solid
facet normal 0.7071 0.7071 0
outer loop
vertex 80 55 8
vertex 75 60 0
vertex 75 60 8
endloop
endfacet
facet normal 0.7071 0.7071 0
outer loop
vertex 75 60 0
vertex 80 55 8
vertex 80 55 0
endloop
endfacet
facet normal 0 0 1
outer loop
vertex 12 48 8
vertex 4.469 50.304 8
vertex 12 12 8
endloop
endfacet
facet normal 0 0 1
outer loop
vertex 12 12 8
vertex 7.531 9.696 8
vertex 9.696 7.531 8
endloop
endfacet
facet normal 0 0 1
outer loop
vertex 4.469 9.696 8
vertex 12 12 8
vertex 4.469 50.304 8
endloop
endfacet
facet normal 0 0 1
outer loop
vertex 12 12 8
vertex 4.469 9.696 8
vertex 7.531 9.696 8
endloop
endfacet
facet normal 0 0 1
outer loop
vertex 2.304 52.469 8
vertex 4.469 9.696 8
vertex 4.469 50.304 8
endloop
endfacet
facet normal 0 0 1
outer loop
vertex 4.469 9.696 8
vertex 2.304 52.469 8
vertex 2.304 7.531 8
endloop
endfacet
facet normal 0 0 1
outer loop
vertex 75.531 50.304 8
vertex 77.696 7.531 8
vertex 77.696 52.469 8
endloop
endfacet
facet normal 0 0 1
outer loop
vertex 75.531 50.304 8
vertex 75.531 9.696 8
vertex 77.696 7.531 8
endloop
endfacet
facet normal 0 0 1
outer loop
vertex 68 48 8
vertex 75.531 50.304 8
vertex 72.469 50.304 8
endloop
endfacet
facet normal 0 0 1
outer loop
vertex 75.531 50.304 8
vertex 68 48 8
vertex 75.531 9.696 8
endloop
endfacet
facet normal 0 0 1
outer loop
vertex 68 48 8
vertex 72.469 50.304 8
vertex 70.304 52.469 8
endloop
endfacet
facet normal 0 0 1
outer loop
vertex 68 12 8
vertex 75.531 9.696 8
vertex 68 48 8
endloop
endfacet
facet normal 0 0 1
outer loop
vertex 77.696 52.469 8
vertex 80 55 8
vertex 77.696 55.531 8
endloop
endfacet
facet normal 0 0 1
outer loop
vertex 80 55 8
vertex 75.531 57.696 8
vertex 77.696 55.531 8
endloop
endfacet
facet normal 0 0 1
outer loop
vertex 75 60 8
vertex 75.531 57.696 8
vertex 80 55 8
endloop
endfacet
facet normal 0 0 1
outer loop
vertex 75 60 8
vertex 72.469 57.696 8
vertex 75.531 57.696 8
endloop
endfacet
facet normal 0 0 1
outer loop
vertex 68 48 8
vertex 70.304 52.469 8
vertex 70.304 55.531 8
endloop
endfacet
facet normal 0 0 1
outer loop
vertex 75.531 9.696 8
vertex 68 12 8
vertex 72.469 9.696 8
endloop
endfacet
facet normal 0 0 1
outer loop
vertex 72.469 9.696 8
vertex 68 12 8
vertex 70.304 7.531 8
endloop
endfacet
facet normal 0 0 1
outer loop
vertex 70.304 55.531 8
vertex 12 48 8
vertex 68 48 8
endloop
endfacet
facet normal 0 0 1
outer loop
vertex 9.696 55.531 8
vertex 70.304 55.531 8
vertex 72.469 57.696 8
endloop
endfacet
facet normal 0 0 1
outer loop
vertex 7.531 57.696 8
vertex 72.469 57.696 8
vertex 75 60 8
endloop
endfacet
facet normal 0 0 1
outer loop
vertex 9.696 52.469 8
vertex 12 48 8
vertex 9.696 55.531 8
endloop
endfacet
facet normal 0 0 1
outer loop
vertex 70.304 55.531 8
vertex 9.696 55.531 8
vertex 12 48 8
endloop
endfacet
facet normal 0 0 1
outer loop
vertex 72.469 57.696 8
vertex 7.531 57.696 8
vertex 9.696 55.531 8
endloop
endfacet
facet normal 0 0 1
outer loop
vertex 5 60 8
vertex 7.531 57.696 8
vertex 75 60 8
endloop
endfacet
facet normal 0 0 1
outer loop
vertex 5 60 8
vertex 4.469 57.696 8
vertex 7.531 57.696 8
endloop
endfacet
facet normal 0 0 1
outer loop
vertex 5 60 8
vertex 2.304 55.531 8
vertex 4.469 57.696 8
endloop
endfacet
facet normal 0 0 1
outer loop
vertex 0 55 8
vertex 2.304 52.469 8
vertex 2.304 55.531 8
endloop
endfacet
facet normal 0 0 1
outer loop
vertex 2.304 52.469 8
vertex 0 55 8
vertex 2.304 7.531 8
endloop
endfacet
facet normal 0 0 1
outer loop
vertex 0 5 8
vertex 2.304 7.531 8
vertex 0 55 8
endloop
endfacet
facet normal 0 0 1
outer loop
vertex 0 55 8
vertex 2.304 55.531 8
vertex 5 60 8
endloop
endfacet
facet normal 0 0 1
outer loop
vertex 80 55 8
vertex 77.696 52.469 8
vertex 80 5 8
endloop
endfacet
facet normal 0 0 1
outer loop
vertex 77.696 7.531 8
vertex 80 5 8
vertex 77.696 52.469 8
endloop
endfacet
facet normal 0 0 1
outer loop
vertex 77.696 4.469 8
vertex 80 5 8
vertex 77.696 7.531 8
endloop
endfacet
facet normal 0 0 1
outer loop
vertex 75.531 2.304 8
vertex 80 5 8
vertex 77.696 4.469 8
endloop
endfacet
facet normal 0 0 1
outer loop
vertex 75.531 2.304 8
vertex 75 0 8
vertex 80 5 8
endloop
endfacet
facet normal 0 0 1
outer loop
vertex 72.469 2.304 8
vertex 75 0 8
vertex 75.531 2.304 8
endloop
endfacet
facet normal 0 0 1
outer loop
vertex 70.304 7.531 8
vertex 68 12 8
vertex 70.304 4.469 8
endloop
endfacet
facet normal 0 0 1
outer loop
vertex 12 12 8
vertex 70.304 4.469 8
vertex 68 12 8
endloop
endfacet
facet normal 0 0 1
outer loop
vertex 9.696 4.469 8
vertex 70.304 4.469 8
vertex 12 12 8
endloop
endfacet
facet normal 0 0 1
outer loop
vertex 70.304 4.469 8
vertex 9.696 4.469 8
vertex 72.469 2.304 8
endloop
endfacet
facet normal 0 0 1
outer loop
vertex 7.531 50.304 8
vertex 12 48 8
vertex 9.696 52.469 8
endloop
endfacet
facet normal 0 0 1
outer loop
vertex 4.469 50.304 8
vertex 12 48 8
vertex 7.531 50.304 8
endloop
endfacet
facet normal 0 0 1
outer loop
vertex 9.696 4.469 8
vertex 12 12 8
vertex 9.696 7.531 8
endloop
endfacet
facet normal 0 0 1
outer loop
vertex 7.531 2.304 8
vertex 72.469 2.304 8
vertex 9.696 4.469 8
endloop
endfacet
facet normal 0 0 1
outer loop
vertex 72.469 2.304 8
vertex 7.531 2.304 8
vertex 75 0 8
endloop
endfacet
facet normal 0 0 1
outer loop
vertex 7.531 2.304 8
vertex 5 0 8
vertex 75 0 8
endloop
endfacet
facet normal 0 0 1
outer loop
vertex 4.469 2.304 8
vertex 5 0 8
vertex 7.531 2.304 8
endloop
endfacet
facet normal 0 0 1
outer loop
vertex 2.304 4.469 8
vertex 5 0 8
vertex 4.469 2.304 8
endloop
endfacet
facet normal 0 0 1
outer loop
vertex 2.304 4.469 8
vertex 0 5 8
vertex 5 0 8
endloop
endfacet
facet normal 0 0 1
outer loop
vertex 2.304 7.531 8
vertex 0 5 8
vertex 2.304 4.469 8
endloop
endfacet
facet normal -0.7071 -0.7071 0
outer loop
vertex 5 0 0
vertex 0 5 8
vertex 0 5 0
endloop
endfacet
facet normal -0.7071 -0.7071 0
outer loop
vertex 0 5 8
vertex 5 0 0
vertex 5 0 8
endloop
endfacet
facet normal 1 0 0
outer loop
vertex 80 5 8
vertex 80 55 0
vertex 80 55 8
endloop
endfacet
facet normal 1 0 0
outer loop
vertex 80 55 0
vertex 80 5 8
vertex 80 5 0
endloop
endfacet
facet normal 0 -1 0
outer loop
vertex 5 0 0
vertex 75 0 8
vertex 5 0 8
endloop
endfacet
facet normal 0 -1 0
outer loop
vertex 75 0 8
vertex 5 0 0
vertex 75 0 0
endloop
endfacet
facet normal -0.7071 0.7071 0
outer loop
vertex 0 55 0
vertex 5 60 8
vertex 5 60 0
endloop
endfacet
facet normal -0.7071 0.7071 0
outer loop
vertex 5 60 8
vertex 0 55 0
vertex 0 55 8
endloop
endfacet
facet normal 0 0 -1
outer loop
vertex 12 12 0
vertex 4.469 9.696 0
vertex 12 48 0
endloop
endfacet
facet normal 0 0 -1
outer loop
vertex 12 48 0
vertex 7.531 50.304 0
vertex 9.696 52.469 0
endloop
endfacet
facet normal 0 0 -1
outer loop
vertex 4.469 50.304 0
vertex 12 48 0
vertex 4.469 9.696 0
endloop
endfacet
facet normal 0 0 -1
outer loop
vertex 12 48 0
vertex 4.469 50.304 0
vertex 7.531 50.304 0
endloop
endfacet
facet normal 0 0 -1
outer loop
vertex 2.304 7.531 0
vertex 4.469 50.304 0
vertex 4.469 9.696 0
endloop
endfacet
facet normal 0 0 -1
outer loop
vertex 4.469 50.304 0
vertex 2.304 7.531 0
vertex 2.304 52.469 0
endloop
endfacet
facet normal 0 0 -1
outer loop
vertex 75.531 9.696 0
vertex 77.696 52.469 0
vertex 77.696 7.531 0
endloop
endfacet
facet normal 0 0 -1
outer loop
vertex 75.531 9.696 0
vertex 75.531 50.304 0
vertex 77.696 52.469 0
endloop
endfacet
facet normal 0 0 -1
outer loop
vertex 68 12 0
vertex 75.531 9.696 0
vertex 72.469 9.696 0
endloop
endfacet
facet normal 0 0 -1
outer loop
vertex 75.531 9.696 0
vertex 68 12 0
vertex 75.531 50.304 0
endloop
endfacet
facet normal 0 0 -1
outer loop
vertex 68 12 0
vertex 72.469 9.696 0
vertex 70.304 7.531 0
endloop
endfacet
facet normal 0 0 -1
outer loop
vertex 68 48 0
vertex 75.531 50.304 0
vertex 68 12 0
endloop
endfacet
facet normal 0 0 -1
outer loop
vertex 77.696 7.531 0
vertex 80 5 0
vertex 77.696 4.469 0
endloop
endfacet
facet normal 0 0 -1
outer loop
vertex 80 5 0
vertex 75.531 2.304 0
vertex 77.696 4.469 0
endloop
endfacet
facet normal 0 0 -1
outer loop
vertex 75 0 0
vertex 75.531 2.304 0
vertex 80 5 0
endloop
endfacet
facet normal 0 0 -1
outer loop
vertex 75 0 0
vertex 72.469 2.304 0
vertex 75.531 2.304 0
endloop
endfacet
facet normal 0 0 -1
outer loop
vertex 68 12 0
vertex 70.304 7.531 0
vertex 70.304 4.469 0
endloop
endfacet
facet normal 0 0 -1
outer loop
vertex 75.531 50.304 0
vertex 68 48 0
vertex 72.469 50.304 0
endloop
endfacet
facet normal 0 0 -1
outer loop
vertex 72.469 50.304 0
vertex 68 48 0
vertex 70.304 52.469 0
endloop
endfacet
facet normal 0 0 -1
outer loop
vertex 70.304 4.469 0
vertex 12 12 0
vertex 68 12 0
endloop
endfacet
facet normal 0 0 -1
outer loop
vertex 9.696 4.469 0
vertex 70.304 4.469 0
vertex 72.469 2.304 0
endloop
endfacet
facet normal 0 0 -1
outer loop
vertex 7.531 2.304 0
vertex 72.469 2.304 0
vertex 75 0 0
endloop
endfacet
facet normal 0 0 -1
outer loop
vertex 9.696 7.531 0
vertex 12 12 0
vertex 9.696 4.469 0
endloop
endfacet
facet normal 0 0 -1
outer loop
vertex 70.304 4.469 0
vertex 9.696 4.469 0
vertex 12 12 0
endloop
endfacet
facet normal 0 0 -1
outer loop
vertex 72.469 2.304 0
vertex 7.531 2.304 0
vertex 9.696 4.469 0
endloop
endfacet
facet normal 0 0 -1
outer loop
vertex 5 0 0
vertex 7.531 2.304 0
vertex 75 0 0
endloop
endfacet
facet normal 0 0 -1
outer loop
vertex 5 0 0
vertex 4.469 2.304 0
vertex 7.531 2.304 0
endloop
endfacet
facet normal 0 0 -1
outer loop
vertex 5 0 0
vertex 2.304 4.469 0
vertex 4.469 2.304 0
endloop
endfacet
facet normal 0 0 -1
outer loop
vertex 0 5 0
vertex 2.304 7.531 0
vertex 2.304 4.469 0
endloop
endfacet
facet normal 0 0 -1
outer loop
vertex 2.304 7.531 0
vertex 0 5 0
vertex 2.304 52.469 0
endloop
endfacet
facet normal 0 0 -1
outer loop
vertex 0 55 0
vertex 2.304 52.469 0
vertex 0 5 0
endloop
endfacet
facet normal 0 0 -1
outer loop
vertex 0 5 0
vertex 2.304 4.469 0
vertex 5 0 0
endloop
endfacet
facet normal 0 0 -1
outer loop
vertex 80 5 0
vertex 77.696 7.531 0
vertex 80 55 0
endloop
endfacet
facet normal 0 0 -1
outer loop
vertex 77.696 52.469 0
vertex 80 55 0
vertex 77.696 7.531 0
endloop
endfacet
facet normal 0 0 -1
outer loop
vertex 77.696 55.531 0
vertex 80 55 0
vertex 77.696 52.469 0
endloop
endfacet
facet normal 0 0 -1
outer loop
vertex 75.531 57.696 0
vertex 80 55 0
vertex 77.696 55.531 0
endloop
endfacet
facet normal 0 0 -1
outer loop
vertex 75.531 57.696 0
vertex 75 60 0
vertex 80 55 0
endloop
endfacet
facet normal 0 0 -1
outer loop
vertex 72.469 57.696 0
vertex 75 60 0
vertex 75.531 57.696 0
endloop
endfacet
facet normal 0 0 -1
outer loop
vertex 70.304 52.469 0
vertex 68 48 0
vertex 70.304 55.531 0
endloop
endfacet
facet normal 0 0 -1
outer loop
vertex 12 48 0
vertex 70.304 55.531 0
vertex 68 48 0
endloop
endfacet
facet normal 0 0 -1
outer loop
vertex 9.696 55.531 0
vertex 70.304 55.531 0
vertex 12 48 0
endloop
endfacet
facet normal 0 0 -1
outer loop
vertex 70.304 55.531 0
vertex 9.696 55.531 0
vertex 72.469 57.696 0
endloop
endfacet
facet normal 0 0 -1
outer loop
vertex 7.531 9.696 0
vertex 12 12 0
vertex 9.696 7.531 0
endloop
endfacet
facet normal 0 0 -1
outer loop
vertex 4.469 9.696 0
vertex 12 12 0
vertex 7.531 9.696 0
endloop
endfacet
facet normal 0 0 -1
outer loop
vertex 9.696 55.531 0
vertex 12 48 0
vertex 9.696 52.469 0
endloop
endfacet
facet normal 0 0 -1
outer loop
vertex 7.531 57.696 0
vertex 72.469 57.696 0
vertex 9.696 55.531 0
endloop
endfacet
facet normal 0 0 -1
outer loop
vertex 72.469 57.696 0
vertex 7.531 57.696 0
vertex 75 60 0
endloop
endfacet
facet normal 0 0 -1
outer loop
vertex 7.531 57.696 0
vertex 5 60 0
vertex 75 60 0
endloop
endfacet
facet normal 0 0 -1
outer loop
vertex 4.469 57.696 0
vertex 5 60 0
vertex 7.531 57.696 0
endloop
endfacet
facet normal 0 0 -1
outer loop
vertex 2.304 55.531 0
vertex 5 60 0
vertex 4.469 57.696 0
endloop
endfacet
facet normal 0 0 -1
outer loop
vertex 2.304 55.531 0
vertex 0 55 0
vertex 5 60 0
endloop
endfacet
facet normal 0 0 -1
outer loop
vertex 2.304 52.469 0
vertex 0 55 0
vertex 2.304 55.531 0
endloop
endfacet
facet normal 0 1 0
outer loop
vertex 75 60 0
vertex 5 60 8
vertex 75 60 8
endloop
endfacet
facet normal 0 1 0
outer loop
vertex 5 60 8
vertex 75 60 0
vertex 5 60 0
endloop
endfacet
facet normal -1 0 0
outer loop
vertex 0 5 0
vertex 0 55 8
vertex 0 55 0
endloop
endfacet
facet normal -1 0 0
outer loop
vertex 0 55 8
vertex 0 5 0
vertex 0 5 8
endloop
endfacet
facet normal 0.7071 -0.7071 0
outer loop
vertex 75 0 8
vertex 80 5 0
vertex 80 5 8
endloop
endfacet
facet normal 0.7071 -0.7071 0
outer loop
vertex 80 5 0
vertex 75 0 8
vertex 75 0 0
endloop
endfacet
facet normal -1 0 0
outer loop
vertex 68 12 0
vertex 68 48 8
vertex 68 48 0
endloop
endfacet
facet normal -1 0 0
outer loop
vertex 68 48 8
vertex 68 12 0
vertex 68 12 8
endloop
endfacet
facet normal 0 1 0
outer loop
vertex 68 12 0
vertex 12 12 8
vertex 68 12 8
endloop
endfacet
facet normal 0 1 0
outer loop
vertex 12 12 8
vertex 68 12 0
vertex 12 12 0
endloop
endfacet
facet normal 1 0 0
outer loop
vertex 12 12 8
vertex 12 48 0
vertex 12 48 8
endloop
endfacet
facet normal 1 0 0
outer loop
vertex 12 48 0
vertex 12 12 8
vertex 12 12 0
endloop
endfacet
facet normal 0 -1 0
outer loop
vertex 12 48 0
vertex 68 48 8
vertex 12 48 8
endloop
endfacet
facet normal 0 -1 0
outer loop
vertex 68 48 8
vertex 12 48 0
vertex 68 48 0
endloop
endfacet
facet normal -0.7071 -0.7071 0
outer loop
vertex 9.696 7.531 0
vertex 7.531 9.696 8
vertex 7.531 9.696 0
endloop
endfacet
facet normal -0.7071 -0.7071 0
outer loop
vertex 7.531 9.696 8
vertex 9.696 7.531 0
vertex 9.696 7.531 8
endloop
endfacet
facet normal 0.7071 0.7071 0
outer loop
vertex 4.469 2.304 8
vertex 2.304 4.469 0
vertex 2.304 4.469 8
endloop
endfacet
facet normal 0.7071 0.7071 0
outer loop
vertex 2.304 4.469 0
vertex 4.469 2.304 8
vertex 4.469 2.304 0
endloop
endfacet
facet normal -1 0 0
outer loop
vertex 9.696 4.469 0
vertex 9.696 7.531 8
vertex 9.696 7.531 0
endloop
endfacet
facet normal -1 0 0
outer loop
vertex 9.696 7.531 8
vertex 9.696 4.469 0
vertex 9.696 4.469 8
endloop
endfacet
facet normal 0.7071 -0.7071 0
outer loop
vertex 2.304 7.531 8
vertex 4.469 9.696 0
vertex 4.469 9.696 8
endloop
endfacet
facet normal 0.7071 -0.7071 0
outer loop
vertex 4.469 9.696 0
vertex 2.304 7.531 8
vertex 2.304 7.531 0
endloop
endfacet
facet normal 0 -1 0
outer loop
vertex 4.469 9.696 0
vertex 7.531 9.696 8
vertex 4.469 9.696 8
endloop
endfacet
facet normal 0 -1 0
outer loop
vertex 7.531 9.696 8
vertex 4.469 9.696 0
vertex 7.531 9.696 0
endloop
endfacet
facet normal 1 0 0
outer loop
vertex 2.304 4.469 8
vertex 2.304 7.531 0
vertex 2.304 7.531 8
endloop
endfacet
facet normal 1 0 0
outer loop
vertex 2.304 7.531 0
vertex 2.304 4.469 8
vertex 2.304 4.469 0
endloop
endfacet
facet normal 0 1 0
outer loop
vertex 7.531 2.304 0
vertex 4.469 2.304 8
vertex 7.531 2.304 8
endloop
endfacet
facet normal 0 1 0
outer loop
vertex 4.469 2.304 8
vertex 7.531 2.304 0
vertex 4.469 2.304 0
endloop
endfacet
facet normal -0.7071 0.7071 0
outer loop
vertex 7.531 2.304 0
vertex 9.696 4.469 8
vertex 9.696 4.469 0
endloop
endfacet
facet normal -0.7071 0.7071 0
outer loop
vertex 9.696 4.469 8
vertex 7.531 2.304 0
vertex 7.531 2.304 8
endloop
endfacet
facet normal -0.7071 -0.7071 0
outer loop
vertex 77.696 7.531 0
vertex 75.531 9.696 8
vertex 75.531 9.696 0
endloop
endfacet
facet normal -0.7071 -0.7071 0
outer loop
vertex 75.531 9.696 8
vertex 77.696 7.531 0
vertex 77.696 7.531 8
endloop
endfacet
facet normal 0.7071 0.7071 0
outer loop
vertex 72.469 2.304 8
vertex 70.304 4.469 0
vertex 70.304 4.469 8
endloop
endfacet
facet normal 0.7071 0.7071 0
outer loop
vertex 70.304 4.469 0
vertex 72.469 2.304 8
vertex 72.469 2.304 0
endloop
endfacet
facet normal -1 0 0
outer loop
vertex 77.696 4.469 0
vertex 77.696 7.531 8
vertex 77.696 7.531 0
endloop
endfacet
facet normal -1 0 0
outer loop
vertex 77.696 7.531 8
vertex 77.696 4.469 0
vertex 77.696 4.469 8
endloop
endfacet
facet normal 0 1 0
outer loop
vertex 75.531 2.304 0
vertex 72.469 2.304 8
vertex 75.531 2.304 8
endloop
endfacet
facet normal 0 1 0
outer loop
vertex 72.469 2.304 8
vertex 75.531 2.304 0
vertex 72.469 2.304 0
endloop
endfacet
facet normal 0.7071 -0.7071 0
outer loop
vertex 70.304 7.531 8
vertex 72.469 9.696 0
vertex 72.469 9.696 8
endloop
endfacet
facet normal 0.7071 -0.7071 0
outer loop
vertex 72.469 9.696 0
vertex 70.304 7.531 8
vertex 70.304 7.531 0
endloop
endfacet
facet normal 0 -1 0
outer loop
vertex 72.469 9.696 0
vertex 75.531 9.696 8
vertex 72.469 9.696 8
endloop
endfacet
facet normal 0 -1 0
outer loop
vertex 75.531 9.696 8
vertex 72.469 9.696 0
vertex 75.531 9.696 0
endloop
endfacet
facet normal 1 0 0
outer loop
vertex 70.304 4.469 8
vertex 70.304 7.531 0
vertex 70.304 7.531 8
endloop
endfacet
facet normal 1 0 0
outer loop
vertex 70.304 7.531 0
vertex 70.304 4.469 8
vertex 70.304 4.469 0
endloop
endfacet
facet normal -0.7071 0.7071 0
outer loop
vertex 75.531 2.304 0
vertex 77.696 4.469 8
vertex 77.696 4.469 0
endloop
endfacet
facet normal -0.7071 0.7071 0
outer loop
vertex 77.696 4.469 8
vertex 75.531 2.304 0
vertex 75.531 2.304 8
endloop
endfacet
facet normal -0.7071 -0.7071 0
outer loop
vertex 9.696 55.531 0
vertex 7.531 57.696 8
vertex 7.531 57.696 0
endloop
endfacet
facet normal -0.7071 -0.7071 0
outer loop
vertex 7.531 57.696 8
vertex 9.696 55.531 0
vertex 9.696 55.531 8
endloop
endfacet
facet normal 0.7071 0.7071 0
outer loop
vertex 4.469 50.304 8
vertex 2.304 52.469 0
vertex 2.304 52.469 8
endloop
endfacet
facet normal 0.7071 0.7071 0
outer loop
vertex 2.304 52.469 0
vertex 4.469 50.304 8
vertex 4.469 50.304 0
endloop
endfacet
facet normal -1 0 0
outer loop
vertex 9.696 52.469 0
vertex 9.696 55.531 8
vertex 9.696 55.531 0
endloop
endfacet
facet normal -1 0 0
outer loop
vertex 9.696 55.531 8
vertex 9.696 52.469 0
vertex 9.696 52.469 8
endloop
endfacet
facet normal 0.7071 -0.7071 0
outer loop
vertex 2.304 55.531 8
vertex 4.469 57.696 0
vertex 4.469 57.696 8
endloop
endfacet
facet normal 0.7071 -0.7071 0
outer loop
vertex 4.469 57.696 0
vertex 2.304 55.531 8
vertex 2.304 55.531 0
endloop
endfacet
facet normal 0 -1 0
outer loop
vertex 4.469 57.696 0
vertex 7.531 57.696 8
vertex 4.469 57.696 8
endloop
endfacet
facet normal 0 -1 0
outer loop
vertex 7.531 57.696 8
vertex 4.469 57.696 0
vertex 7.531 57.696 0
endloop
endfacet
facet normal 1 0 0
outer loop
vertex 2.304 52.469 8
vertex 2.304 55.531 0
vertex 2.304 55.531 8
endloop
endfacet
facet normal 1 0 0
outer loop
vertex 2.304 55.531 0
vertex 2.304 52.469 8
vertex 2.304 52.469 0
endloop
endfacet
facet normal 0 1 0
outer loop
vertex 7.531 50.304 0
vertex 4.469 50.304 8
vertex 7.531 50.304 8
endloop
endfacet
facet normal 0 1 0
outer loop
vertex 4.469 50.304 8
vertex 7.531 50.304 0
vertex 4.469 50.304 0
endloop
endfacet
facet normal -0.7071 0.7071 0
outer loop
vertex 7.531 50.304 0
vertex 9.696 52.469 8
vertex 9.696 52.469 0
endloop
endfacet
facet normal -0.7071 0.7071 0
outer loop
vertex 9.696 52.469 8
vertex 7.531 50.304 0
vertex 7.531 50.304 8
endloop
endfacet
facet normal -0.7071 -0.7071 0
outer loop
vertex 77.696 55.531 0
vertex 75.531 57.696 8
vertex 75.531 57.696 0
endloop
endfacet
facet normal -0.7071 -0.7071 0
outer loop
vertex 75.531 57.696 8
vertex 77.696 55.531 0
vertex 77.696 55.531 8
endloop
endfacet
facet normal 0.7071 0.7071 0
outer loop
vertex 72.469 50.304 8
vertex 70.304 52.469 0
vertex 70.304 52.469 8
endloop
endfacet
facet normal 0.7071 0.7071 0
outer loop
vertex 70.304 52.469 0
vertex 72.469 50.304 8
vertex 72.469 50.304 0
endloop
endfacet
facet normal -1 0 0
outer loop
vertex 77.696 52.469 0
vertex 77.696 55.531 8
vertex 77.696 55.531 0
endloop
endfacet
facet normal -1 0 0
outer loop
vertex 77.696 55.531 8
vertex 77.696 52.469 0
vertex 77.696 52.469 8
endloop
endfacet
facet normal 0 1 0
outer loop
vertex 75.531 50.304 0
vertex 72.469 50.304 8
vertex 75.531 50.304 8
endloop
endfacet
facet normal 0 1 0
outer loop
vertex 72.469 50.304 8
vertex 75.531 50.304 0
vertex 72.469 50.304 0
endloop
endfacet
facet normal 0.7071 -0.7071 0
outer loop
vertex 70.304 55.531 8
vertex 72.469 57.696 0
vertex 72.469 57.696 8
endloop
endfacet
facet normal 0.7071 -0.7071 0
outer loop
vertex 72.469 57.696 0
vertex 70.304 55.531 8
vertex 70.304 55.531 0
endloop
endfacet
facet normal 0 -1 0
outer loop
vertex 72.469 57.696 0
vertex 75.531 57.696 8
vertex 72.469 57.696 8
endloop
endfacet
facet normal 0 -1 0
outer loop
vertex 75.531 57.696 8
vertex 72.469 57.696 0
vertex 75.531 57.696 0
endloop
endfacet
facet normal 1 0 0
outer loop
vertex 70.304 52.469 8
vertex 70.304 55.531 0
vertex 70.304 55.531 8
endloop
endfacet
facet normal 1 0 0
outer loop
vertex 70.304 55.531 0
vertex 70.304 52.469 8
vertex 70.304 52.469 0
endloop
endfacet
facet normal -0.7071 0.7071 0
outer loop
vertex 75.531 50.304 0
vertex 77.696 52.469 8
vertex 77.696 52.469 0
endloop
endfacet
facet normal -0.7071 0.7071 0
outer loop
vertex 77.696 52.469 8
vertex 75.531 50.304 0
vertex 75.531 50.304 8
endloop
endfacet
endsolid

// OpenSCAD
$fn = 32;

// ----------------------------------------------------------------------
// Frame plate: 80 x 60 frame, 12 mm rails
// ----------------------------------------------------------------------

// --- parameters (mm) ---
plate_l = 80;             // plate length, X
plate_w = 60;             // plate width, Y
plate_t = 8;              // plate thickness, Z (extrusion height)
corner_c = 5;             // corner chamfer
frame_bar = 12;           // frame rail width
bolt_r = 4;               // corner bolt window radius
bolt_inset = 6;           // bolt centre inset from the edges

win_l = plate_l - 2 * frame_bar;  // window length
win_w = plate_w - 2 * frame_bar;  // window width
bolt_d = 2 * bolt_r;  // corner hole diameter

profile = [[5, 0], [75, 0], [80, 5], [80, 55], [75, 60], [5, 60], [0, 55], [0, 5]];  // primary outline, 8 points, counter clockwise
void_1 = [[12, 12], [68, 12], [68, 48], [12, 48]];  // the window, 4 points
void_2 = [[9.696, 7.531], [7.531, 9.696], [4.469, 9.696], [2.304, 7.531], [2.304, 4.469], [4.469, 2.304], [7.531, 2.304], [9.696, 4.469]];  // corner bolt window, 8 points
void_3 = [[77.696, 7.531], [75.531, 9.696], [72.469, 9.696], [70.304, 7.531], [70.304, 4.469], [72.469, 2.304], [75.531, 2.304], [77.696, 4.469]];  // corner bolt window, 8 points
void_4 = [[9.696, 55.531], [7.531, 57.696], [4.469, 57.696], [2.304, 55.531], [2.304, 52.469], [4.469, 50.304], [7.531, 50.304], [9.696, 52.469]];  // corner bolt window, 8 points
void_5 = [[77.696, 55.531], [75.531, 57.696], [72.469, 57.696], [70.304, 55.531], [70.304, 52.469], [72.469, 50.304], [75.531, 50.304], [77.696, 52.469]];  // corner bolt window, 8 points

// --- the one profile operation ---
difference() {
  linear_extrude(height = plate_t) polygon(points = profile);
  translate([0, 0, -1])
    linear_extrude(height = plate_t + 2) polygon(points = void_1);
  translate([0, 0, -1])
    linear_extrude(height = plate_t + 2) polygon(points = void_2);
  translate([0, 0, -1])
    linear_extrude(height = plate_t + 2) polygon(points = void_3);
  translate([0, 0, -1])
    linear_extrude(height = plate_t + 2) polygon(points = void_4);
  translate([0, 0, -1])
    linear_extrude(height = plate_t + 2) polygon(points = void_5);
}
